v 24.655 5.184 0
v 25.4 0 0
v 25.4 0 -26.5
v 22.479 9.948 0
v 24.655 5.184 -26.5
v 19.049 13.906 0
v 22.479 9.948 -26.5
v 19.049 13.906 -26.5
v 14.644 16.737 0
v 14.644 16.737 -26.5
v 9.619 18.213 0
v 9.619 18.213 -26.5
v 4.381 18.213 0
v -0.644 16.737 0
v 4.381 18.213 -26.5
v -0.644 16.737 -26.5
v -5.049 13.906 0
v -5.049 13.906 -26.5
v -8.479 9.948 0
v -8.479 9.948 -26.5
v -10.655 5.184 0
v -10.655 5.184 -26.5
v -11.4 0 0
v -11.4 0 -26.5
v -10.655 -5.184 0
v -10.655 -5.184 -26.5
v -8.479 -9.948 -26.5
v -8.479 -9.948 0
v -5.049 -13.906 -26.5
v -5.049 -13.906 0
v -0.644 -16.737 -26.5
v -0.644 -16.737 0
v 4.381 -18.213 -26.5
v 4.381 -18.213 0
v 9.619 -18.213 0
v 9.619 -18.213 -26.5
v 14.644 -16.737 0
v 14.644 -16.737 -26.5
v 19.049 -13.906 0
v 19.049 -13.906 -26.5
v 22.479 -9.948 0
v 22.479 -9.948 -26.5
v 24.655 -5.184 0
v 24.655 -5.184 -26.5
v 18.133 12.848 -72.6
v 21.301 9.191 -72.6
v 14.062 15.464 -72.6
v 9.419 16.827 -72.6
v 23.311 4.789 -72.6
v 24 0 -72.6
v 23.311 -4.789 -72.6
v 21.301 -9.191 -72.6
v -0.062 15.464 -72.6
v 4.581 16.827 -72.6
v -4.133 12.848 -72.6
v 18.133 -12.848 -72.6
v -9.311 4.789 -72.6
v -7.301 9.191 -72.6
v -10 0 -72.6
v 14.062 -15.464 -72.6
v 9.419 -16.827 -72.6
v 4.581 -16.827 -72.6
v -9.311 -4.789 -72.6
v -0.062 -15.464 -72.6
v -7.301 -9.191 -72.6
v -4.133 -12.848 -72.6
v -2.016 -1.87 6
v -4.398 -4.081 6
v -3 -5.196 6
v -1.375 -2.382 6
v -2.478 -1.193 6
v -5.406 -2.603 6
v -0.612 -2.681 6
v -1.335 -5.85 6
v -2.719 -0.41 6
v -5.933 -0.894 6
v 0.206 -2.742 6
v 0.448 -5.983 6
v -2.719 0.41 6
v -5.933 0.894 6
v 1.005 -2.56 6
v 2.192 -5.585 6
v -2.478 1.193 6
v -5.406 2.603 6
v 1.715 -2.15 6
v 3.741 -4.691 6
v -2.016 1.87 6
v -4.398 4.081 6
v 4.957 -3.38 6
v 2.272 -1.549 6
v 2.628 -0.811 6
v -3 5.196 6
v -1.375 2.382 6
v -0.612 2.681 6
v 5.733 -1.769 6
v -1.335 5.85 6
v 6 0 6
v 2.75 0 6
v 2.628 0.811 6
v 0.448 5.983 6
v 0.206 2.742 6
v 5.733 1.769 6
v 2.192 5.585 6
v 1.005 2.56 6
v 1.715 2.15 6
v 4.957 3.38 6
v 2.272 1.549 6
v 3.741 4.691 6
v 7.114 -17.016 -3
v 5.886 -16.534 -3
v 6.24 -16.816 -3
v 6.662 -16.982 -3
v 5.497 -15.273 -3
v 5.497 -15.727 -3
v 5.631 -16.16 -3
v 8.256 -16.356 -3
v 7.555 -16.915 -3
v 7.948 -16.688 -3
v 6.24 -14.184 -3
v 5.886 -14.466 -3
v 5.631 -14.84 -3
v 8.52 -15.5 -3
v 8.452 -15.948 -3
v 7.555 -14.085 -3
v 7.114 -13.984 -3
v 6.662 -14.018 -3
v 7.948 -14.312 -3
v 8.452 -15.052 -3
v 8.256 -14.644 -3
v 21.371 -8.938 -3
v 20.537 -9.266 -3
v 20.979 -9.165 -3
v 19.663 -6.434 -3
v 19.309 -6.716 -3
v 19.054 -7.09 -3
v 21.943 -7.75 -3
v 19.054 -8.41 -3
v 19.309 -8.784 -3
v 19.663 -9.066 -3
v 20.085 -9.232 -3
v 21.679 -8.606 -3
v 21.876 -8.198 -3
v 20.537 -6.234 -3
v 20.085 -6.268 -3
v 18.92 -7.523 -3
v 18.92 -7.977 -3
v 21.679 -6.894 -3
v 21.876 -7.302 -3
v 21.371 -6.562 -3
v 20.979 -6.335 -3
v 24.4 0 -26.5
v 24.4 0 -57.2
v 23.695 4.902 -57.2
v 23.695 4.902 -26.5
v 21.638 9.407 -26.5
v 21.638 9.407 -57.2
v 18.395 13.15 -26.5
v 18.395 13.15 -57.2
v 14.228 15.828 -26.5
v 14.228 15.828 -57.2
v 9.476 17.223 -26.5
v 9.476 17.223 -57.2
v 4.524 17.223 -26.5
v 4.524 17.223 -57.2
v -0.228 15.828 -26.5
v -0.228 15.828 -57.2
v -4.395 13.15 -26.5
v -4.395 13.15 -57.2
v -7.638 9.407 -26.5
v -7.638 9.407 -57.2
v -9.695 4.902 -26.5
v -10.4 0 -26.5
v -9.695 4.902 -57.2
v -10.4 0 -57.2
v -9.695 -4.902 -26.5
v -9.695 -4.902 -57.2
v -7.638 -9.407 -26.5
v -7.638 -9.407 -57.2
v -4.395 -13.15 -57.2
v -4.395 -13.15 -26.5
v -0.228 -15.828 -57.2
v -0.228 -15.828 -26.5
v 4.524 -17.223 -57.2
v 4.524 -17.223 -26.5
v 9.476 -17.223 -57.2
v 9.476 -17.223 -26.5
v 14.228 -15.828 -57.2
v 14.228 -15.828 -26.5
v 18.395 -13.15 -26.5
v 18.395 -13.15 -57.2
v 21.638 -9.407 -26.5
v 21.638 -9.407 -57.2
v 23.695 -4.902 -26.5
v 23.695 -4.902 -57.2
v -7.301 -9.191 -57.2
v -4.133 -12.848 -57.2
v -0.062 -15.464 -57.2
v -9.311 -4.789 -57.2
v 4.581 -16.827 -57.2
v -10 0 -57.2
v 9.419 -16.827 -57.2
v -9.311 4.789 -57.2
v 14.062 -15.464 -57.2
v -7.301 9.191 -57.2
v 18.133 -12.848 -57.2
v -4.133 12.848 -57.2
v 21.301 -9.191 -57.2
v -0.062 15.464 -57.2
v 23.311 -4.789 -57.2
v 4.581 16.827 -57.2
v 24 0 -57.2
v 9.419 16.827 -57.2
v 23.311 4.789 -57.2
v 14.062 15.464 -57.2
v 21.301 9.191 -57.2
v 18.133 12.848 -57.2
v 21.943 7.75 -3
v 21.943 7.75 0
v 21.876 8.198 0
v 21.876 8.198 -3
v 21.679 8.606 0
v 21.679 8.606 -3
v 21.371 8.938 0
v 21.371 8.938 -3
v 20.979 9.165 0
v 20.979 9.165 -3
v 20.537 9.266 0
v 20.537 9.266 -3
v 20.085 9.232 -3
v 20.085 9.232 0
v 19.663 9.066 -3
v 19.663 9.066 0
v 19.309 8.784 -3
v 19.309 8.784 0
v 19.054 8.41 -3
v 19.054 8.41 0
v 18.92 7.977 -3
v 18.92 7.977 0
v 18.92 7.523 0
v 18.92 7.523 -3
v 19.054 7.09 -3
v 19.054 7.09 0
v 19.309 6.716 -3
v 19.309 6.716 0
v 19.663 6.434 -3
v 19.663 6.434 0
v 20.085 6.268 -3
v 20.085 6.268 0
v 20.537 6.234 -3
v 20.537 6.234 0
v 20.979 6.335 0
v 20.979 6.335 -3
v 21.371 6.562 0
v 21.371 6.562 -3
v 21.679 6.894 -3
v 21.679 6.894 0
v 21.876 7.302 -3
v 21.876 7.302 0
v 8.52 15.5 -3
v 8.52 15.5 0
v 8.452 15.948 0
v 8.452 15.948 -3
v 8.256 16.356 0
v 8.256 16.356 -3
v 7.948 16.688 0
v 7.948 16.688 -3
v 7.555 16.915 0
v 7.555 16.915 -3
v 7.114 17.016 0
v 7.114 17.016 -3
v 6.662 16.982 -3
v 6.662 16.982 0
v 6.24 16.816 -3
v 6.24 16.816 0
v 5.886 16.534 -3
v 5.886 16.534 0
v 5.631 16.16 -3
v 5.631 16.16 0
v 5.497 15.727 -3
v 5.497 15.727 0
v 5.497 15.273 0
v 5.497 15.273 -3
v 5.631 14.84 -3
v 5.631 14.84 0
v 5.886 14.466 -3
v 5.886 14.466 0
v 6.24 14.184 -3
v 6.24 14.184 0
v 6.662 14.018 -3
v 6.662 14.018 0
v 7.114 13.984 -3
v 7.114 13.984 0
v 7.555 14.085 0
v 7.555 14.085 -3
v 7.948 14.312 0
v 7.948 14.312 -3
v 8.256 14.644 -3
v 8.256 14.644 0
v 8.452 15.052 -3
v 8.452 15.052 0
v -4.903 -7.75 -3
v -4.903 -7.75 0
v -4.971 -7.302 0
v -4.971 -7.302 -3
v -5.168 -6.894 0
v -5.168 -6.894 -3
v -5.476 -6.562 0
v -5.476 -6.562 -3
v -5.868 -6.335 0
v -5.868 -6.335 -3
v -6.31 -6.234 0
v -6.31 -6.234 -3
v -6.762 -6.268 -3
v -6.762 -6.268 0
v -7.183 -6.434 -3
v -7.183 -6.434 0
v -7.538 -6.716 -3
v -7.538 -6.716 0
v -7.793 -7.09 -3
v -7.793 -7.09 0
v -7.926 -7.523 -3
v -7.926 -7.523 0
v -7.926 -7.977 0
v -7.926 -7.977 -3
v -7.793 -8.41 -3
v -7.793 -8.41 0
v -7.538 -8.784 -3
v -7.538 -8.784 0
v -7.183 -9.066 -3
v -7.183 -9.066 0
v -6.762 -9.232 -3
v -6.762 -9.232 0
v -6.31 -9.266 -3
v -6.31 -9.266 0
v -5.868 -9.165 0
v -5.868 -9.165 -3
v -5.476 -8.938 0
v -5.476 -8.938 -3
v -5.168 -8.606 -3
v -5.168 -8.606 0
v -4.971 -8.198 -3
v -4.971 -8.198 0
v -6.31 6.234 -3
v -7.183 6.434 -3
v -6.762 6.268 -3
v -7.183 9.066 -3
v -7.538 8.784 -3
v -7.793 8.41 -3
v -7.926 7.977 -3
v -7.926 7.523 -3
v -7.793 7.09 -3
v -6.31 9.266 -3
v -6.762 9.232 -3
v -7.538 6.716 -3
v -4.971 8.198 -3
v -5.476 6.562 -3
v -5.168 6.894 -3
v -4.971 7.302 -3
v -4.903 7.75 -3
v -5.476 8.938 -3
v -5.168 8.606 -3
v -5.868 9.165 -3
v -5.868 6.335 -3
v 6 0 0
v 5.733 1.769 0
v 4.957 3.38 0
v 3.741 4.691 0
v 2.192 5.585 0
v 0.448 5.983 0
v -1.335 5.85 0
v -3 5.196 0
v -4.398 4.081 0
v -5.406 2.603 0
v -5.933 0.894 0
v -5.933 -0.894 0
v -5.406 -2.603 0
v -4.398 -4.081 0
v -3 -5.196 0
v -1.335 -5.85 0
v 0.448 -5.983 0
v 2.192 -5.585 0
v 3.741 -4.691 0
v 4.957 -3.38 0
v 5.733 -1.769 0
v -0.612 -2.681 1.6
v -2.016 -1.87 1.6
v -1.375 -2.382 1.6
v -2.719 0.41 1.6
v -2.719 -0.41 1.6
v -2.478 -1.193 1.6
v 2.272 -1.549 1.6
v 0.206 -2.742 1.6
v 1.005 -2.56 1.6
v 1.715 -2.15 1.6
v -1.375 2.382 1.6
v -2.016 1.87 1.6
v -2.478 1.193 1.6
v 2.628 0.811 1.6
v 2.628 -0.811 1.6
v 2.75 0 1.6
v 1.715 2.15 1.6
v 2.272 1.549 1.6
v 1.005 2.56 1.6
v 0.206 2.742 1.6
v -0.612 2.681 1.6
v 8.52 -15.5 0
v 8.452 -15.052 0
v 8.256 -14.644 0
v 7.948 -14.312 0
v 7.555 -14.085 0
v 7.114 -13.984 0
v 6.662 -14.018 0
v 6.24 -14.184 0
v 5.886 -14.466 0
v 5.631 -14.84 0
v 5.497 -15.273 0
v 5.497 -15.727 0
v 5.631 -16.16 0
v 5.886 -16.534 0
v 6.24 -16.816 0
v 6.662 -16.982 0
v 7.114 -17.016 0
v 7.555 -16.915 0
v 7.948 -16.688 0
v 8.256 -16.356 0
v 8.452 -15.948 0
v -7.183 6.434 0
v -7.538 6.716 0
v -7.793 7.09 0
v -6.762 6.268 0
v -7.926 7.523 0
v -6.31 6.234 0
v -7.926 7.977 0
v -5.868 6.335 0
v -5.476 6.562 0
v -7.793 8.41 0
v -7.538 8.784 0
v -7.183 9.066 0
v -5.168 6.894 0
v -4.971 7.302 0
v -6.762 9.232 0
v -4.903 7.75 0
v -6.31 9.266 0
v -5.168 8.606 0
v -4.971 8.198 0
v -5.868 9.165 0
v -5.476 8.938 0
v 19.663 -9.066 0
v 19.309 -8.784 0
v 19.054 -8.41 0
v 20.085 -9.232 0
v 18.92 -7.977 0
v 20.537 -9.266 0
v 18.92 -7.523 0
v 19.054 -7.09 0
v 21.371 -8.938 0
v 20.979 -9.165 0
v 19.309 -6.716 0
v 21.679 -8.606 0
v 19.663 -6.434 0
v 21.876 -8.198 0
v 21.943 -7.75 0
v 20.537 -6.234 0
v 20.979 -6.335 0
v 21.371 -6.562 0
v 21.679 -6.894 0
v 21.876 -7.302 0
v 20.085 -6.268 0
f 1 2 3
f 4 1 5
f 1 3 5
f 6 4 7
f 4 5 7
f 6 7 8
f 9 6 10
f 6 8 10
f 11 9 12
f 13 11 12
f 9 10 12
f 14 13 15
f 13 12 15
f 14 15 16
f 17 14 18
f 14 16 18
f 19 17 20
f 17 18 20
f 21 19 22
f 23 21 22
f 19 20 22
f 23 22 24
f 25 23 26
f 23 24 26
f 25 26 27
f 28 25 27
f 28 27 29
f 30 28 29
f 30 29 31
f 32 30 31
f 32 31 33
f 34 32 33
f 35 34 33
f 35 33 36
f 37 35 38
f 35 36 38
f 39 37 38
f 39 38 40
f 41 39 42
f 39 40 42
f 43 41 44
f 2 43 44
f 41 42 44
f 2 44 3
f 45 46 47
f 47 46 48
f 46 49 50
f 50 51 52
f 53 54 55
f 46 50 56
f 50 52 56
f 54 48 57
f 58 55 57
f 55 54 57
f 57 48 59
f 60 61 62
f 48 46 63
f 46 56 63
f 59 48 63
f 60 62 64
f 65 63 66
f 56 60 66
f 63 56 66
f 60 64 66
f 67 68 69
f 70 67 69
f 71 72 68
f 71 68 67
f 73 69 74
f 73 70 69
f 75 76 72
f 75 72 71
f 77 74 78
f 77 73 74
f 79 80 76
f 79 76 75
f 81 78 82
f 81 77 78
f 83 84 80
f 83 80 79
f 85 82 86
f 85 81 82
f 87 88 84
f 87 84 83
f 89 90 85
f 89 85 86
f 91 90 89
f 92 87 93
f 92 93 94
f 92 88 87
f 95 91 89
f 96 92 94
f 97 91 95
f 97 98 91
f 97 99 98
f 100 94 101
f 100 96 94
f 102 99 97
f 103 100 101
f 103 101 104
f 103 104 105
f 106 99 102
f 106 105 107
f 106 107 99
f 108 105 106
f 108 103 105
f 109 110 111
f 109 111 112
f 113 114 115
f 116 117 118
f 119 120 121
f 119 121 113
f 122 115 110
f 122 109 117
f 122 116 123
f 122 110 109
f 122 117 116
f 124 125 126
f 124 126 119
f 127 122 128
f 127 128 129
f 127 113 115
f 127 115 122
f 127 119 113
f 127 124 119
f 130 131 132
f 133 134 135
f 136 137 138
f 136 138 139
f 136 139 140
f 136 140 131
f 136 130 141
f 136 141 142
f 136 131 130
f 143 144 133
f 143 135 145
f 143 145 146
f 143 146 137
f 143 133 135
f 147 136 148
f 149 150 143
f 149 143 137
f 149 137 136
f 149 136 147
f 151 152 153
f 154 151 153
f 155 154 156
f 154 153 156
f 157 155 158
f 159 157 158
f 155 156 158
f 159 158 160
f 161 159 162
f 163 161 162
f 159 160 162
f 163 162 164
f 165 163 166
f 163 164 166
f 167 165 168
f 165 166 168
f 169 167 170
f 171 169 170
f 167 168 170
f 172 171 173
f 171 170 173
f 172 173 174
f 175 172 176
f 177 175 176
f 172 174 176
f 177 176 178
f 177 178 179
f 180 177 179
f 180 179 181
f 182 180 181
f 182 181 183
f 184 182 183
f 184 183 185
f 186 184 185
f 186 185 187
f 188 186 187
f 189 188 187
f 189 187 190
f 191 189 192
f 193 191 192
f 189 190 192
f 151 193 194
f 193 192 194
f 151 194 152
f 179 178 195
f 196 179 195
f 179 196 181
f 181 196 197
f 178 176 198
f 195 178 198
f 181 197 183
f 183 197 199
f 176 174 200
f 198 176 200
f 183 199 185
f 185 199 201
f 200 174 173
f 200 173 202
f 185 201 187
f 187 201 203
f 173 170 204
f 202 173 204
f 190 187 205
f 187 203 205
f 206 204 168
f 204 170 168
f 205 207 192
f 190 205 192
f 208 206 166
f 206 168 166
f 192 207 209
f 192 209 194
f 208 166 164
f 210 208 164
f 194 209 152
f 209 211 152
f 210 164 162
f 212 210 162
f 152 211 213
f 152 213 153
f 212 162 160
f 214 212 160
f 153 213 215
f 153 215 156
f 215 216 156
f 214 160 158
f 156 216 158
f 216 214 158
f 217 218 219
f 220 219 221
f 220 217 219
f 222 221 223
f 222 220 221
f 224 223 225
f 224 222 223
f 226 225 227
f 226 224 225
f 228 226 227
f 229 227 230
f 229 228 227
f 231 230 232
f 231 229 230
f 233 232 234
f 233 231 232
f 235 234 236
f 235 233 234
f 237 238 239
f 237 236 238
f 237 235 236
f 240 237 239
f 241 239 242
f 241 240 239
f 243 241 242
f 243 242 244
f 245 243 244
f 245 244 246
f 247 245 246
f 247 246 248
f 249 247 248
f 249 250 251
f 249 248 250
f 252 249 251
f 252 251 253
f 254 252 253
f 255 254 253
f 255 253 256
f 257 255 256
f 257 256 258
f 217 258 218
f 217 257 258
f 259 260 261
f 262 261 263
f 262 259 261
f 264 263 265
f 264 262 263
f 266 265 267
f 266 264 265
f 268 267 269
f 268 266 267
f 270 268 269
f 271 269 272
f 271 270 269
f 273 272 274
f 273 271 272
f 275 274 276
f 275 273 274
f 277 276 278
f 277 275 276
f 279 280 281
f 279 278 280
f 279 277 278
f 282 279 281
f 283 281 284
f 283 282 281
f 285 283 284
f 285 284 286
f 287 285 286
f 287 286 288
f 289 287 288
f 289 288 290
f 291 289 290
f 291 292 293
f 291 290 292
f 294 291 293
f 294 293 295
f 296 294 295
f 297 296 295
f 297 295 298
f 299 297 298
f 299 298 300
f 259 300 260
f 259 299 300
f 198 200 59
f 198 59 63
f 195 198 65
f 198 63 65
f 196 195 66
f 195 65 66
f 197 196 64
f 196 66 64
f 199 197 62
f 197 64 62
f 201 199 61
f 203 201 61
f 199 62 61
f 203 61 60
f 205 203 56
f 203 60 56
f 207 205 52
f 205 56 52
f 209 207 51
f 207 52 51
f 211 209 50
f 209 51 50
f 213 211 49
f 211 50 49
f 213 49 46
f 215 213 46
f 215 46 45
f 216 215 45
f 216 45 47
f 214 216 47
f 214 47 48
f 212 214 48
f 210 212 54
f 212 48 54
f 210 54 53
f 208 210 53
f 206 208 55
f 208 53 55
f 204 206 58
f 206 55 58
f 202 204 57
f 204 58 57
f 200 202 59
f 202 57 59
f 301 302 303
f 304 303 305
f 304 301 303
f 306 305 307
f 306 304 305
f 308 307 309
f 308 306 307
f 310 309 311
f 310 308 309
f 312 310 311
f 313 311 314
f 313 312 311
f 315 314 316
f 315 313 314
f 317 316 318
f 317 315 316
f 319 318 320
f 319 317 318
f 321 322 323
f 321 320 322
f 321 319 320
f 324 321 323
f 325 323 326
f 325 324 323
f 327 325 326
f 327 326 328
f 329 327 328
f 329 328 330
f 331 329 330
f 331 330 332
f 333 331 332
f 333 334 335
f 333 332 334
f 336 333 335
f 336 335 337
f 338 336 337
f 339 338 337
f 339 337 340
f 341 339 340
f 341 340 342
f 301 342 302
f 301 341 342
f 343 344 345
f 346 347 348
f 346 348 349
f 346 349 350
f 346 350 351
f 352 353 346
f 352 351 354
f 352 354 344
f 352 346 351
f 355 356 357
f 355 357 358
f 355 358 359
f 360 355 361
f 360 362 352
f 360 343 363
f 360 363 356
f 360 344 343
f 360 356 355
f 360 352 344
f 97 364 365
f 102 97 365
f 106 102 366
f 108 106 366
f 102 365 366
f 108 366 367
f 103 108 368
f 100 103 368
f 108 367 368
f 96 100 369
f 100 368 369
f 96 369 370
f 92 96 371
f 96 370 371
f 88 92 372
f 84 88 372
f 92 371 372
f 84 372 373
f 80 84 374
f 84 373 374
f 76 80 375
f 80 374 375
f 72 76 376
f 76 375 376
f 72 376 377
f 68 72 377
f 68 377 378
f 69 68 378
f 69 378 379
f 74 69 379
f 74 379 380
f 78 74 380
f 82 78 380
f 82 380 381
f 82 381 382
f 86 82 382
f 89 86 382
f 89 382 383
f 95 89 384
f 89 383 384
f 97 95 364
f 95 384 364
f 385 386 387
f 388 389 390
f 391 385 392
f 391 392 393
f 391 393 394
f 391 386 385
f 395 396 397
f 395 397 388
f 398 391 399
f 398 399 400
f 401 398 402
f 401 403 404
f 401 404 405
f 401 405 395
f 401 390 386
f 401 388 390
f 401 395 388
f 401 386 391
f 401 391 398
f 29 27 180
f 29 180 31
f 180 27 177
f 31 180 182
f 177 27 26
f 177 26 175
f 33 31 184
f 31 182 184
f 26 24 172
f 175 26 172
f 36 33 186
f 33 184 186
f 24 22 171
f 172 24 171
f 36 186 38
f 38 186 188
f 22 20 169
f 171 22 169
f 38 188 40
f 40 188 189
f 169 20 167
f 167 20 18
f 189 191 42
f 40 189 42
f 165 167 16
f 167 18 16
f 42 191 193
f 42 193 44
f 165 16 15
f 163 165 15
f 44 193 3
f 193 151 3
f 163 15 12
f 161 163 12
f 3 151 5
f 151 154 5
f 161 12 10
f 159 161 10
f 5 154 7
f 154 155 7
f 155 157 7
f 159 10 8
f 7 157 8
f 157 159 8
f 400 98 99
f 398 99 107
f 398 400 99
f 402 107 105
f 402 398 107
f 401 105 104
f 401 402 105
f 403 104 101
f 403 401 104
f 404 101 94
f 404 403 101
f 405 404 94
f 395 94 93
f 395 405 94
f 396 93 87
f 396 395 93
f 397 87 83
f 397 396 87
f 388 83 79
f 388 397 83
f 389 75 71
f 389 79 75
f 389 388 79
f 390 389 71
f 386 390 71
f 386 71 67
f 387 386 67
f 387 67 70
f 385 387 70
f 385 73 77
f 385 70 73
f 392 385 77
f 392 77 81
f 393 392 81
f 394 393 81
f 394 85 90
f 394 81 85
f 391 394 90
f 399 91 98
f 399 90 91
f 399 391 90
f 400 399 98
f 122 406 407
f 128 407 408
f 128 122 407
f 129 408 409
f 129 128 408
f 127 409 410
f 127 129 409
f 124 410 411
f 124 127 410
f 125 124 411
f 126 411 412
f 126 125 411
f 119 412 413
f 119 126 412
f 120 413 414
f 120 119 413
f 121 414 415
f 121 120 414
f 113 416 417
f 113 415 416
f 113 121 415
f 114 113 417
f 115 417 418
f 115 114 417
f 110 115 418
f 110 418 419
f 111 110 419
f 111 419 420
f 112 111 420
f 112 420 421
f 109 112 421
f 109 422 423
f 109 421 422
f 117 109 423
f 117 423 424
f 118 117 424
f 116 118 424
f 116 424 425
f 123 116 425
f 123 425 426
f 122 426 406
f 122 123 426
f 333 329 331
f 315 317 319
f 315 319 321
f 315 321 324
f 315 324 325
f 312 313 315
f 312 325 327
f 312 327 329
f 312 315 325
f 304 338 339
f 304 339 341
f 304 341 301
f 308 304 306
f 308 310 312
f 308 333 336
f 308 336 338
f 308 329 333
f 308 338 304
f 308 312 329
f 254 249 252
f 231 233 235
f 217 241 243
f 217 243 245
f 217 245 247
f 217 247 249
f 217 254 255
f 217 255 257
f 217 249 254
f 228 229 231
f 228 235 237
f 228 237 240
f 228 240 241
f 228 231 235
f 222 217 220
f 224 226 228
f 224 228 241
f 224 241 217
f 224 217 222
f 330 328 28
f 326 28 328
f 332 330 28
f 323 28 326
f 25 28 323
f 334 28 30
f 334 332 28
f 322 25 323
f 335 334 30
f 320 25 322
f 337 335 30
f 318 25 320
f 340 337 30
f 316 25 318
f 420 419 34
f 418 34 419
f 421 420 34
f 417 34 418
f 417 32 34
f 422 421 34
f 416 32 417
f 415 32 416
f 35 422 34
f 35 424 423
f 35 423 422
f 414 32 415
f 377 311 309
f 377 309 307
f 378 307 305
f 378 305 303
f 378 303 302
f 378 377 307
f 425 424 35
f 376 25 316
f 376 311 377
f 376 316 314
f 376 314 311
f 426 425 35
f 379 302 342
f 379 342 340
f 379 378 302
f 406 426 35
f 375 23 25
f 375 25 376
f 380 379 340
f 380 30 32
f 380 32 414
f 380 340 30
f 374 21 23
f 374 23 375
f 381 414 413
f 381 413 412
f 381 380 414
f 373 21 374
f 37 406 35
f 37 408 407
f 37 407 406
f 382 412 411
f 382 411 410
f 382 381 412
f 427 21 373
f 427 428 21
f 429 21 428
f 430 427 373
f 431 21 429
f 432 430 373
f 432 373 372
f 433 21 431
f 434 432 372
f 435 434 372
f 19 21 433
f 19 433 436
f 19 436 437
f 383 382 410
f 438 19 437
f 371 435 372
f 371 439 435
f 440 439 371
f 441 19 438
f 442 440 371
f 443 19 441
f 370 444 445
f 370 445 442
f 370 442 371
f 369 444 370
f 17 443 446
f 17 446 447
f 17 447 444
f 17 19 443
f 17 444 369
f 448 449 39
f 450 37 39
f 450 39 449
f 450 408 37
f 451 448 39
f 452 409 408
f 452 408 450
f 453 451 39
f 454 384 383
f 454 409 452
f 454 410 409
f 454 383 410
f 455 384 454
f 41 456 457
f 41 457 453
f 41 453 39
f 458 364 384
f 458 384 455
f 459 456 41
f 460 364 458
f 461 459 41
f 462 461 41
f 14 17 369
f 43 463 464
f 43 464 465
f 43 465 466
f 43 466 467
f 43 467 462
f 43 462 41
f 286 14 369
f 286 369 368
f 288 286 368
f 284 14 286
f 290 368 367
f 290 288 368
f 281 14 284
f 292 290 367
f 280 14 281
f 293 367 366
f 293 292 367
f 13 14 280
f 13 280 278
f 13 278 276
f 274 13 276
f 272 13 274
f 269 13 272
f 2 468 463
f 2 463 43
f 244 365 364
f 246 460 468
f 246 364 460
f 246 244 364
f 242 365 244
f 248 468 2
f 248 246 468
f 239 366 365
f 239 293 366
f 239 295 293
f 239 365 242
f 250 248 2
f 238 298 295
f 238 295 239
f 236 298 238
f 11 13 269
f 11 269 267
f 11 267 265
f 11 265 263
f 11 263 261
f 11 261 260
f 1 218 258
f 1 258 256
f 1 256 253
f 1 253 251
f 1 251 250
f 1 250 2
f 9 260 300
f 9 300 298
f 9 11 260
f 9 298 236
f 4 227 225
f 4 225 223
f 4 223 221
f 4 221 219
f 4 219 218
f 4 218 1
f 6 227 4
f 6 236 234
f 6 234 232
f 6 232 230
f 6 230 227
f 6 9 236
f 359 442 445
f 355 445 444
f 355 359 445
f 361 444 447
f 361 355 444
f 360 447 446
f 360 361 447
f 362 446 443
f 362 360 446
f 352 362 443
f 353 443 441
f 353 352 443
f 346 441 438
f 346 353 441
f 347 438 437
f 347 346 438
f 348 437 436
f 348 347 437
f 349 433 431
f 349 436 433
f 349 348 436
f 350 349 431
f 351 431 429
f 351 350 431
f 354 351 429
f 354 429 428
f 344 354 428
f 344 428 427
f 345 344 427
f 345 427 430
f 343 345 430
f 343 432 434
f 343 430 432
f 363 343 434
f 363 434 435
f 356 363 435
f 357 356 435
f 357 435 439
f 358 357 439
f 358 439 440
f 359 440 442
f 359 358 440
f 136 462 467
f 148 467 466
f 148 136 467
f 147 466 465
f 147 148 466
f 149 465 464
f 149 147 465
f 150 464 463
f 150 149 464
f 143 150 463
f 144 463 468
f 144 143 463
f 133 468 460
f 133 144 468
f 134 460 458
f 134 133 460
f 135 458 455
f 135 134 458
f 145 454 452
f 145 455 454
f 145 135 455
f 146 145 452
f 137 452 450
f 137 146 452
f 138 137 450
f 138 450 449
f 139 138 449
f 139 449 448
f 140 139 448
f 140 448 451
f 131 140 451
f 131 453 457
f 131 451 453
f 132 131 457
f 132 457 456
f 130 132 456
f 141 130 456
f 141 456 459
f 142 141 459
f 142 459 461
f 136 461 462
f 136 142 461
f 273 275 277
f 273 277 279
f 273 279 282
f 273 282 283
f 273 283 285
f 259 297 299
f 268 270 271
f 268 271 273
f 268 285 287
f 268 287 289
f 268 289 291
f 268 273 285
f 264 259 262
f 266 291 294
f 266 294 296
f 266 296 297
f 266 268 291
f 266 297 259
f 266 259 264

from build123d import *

# Parameters (mm, degrees)
F_01_START                                  = -57.2
S01_POLOLU_4755_BRUSHED_MOTOR_CAN_R         = 17.4
F_01_POLOLU_4755_BRUSHED_MOTOR_CAN_DEPTH    = 30.7
F_02_START                                  = -26.5
S02_37D_GEARBOX_BODY_R                      = 18.4
F_02_37D_GEARBOX_BODY_DEPTH                 = 26.5
F_03_START                                  = -3
S03_MANUFACTURER_SIX_M3_FACE_THREADS_R      = 1.52
F_03_MANUFACTURER_SIX_M3_FACE_THREADS_DEPTH = 3.2
S04_FRONT_LOCATING_BOSS_R                   = 6
F_04_FRONT_LOCATING_BOSS_DEPTH              = 6
F_05_START                                  = -72.6
S05_QUADRATURE_ENCODER_REAR_CAP_15_4_R      = 17
F_05_QUADRATURE_ENCODER_REAR_CAP_15_4_DEPTH = 15.4
F_06_START                                  = 1.6
S06_SHAFT_JOURNAL_AT_GEARBOX_OUTPUT_R       = 2.75
F_06_SHAFT_JOURNAL_AT_GEARBOX_OUTPUT_DEPTH  = 4.5


with BuildPart() as part:
    # S01 - Pololu 4755 brushed motor can → 01 - Pololu 4755 brushed motor can (new body)
    with BuildSketch(Plane.XY.offset(F_01_START)):
        with Locations((7, 0)):
            Circle(S01_POLOLU_4755_BRUSHED_MOTOR_CAN_R)
    extrude(amount=F_01_POLOLU_4755_BRUSHED_MOTOR_CAN_DEPTH)

    # S02 - 37D gearbox body → 02 - 37D gearbox body (add)
    with BuildSketch(Plane.XY.offset(F_02_START)):
        with Locations((7, 0)):
            Circle(S02_37D_GEARBOX_BODY_R)
    extrude(amount=F_02_37D_GEARBOX_BODY_DEPTH)

    # S03 - Manufacturer six M3 face threads → 03 - Manufacturer six M3 face threads (cut)
    with BuildSketch(Plane.XY.offset(F_03_START)):
        with Locations((20.423393759, 7.75)):
            Circle(S03_MANUFACTURER_SIX_M3_FACE_THREADS_R)
        with Locations((7, 15.5)):
            Circle(S03_MANUFACTURER_SIX_M3_FACE_THREADS_R)
        with Locations((-6.423393759, 7.75)):
            Circle(S03_MANUFACTURER_SIX_M3_FACE_THREADS_R)
        with Locations((-6.423393759, -7.75)):
            Circle(S03_MANUFACTURER_SIX_M3_FACE_THREADS_R)
        with Locations((7, -15.5)):
            Circle(S03_MANUFACTURER_SIX_M3_FACE_THREADS_R)
        with Locations((20.423393759, -7.75)):
            Circle(S03_MANUFACTURER_SIX_M3_FACE_THREADS_R)
    extrude(amount=F_03_MANUFACTURER_SIX_M3_FACE_THREADS_DEPTH, mode=Mode.SUBTRACT)

    # S04 - Front locating boss → 04 - Front locating boss (add)
    with BuildSketch(Plane.XY):
        Circle(S04_FRONT_LOCATING_BOSS_R)
    extrude(amount=F_04_FRONT_LOCATING_BOSS_DEPTH)

    # S05 - Quadrature encoder rear cap - 15.4 mm → 05 - Quadrature encoder rear cap - 15.4 mm (add)
    with BuildSketch(Plane.XY.offset(F_05_START)):
        with Locations(Location((7, 0, 0), (0, 0, 180))):
            Circle(S05_QUADRATURE_ENCODER_REAR_CAP_15_4_R)
    extrude(amount=F_05_QUADRATURE_ENCODER_REAR_CAP_15_4_DEPTH)

    # S06 - Shaft journal at gearbox output → 06 - Shaft journal at gearbox output (cut)
    with BuildSketch(Plane.XY.offset(F_06_START)):
        Circle(S06_SHAFT_JOURNAL_AT_GEARBOX_OUTPUT_R)
    extrude(amount=F_06_SHAFT_JOURNAL_AT_GEARBOX_OUTPUT_DEPTH, mode=Mode.SUBTRACT)


solid = part.part
